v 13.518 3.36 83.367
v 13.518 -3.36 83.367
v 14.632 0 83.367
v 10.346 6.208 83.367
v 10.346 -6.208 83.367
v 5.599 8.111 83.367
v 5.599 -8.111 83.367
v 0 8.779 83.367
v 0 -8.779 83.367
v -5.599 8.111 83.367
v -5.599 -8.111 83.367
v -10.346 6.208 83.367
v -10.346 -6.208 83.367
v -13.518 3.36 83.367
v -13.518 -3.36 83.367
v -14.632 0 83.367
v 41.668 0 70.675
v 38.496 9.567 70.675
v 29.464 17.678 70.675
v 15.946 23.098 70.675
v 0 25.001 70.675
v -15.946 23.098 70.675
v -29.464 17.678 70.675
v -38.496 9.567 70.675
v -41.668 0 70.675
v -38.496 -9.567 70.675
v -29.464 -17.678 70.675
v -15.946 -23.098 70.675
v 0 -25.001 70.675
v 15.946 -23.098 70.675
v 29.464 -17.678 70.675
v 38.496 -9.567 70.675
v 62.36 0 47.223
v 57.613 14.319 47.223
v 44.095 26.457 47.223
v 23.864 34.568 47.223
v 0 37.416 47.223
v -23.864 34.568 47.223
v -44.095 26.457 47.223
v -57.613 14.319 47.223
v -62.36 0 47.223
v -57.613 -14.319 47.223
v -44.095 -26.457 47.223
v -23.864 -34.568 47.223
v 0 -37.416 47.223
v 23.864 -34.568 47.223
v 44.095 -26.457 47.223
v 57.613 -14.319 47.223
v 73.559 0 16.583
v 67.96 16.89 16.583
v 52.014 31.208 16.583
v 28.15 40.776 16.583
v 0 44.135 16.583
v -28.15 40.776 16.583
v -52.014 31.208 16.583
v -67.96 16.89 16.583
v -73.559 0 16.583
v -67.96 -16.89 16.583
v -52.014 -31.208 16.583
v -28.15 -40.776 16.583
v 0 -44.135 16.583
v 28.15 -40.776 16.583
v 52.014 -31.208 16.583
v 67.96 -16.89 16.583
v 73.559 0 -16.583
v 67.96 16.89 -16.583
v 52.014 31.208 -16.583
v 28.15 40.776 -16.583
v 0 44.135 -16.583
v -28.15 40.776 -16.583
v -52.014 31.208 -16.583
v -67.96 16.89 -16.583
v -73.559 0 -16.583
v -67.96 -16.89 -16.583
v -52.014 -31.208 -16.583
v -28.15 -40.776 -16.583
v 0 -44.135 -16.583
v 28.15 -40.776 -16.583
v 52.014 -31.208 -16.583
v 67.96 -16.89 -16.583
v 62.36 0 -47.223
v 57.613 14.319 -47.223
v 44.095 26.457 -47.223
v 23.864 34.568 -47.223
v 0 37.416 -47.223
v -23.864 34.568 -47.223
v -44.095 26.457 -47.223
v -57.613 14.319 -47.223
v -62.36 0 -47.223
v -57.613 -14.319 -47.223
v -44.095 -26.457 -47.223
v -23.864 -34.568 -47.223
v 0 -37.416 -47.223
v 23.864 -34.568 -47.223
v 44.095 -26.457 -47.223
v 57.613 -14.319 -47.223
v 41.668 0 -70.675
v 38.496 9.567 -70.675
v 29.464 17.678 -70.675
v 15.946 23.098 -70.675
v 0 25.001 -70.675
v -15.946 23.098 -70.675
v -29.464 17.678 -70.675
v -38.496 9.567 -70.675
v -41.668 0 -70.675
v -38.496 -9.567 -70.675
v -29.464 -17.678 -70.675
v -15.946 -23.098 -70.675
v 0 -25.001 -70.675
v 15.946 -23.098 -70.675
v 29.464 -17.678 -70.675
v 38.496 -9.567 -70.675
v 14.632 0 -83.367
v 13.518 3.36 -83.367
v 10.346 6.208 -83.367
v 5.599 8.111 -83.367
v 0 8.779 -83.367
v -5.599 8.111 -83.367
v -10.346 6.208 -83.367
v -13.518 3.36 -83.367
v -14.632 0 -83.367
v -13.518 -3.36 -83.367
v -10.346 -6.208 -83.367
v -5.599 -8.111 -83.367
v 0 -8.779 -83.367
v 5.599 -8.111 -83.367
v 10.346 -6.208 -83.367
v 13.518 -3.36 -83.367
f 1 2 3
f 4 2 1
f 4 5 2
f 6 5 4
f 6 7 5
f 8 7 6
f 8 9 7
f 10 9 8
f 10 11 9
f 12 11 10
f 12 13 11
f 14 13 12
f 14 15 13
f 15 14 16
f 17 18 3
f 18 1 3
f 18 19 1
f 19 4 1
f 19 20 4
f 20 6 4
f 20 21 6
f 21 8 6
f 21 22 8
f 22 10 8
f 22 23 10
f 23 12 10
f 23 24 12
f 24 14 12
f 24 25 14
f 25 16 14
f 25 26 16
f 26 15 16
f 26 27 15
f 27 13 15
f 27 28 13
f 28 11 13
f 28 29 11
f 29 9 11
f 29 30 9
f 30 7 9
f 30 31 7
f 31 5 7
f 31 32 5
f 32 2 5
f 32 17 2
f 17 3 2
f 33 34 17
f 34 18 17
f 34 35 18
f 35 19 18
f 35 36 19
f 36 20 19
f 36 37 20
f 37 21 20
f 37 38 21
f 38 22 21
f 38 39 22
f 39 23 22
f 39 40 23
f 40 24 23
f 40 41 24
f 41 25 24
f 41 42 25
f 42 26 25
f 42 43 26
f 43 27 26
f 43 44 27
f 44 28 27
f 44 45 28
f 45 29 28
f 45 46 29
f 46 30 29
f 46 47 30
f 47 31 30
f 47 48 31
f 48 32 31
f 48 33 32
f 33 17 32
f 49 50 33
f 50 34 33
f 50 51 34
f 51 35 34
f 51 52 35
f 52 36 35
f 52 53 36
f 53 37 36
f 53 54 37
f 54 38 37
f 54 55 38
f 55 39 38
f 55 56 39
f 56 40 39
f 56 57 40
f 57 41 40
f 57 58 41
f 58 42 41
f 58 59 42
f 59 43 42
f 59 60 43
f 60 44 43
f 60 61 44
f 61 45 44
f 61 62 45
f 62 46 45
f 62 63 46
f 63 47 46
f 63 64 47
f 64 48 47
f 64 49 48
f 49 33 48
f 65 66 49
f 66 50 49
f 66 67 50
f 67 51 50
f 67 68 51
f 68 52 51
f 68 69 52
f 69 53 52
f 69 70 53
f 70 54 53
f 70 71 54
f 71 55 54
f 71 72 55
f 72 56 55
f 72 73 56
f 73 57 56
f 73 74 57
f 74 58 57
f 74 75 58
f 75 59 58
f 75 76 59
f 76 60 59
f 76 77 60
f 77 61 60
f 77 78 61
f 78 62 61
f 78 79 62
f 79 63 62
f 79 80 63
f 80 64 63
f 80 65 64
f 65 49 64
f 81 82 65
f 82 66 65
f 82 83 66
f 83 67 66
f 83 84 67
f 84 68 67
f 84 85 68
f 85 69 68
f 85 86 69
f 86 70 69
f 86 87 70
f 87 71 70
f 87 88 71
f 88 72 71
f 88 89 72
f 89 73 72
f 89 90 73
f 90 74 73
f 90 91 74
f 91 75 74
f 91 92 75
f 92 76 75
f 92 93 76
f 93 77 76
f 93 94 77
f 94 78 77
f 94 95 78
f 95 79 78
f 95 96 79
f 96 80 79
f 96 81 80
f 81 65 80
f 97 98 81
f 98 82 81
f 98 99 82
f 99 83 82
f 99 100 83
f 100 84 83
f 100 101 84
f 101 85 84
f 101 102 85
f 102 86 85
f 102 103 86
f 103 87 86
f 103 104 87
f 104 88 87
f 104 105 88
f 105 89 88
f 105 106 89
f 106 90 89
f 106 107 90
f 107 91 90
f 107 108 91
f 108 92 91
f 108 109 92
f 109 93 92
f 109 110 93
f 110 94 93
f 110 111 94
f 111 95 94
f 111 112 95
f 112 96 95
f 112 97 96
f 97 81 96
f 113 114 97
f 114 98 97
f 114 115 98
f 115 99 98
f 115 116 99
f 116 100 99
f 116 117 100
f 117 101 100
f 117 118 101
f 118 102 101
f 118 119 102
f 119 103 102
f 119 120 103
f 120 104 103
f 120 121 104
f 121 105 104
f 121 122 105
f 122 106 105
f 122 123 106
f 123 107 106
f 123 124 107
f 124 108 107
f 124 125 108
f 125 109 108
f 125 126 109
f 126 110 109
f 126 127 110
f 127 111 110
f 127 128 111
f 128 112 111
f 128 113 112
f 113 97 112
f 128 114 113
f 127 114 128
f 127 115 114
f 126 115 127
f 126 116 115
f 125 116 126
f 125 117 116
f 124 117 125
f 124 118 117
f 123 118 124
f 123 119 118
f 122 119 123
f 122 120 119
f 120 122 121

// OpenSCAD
// Generated by SolidPython 1.0.1 on 2020-07-29 00:46:52


scale(v = [15, 9, 17]) {
	sphere(r = 5);
}
/***********************************************
*********      SolidPython code:      **********
************************************************
 
# import packages: SolidPython
from solid import *
from solid.utils import *
from itertools import chain, combinations, permutations


class Resize:

    def __init__(self, scad_file):
        self.scad_file = scad_file
        #self.scad_file = import_scad(scad_file)
        # cone/cylinder param:
        self.r1 = 0
        self.r2 = 0
        self.h = 0
        # rectangular prism param:
        self.w = 0
        self.l = 0
        # ellipse param:
        self.r = 0

    # import OpenScad code (file name corresponds to shape)


    # classify shape + parameters
    def assign(self, param1, param2, param3):
        if self.scad_file == 'cone.scad':
            self.r1 = param1
            self.r2 = param2
            self.h = param3
        elif self.scad_file == 'cylinder.scad':
            self.r1 = param1
            self.r2 = param2
            self.h = param3
        elif self.scad_file == 'rectangularPrism.scad':
            self.h = param1
            self.l = param2
            self.w = param3
        else:
            self.r = param1
            self.h = param2

    # resize parameters
    def iterate(self):
        x = range(3, 20, 2)
        i = 1
        if self.scad_file == 'cone.scad':
            tempList = list(permutations(x, 2))
            for temp in tempList:
                param1 = temp[0]
                param2 = temp[1]
                filepath = 'produced_scad_files/' + 'cone' + str(param1) + '_' + str(param2) + '_' + '.scad'
                scad_render_to_file(cylinder(h=param1, r1=param2, r2=0), filepath)

        elif self.scad_file == 'cylinder.scad':
            tempList = list(permutations(x, 3))
            for temp in tempList:
                param1 = temp[0]
                param2 = temp[1]
                filepath = 'produced_scad_files/' + 'cylinder' + str(param1) + '_' + str(param2) + '_' + '.scad'
                scad_render_to_file(cylinder(h=param1, r1=param2, r2=param2), filepath)

        elif self.scad_file == 'rectangularPrism.scad':
            tempList = list(permutations(x, 3))
            for temp in tempList:
                param1 = temp[0]
                param2 = temp[1]
                param3 = temp[2]
                filepath = 'produced_scad_files/' + 'rectangularPrism' + str(param1) + '_' + str(param2) + '_' + str(
                    param3) + '.scad'
                scad_render_to_file(cube(size=(param1, param2, param3)), filepath)

        elif self.scad_file == 'ellipse.scad':
            tempList = list(permutations(x, 4))
            for temp in tempList:
                param1 = temp[0]
                param2 = temp[1]
                param3 = temp[2]
                param4 = temp[3]
                filepath = 'produced_scad_files/' + 'ellipse' + str(param1) + '_' + str(param2) + '_' + str(param3) + '_' + str(param4) + '.scad'
                scad_render_to_file(scale([param1, param2, param3])(sphere(r=param4)), filepath)

    def render_to_scadfile(self):
        scad_render_to_file(scad, 'example.scad') 
 
************************************************/
